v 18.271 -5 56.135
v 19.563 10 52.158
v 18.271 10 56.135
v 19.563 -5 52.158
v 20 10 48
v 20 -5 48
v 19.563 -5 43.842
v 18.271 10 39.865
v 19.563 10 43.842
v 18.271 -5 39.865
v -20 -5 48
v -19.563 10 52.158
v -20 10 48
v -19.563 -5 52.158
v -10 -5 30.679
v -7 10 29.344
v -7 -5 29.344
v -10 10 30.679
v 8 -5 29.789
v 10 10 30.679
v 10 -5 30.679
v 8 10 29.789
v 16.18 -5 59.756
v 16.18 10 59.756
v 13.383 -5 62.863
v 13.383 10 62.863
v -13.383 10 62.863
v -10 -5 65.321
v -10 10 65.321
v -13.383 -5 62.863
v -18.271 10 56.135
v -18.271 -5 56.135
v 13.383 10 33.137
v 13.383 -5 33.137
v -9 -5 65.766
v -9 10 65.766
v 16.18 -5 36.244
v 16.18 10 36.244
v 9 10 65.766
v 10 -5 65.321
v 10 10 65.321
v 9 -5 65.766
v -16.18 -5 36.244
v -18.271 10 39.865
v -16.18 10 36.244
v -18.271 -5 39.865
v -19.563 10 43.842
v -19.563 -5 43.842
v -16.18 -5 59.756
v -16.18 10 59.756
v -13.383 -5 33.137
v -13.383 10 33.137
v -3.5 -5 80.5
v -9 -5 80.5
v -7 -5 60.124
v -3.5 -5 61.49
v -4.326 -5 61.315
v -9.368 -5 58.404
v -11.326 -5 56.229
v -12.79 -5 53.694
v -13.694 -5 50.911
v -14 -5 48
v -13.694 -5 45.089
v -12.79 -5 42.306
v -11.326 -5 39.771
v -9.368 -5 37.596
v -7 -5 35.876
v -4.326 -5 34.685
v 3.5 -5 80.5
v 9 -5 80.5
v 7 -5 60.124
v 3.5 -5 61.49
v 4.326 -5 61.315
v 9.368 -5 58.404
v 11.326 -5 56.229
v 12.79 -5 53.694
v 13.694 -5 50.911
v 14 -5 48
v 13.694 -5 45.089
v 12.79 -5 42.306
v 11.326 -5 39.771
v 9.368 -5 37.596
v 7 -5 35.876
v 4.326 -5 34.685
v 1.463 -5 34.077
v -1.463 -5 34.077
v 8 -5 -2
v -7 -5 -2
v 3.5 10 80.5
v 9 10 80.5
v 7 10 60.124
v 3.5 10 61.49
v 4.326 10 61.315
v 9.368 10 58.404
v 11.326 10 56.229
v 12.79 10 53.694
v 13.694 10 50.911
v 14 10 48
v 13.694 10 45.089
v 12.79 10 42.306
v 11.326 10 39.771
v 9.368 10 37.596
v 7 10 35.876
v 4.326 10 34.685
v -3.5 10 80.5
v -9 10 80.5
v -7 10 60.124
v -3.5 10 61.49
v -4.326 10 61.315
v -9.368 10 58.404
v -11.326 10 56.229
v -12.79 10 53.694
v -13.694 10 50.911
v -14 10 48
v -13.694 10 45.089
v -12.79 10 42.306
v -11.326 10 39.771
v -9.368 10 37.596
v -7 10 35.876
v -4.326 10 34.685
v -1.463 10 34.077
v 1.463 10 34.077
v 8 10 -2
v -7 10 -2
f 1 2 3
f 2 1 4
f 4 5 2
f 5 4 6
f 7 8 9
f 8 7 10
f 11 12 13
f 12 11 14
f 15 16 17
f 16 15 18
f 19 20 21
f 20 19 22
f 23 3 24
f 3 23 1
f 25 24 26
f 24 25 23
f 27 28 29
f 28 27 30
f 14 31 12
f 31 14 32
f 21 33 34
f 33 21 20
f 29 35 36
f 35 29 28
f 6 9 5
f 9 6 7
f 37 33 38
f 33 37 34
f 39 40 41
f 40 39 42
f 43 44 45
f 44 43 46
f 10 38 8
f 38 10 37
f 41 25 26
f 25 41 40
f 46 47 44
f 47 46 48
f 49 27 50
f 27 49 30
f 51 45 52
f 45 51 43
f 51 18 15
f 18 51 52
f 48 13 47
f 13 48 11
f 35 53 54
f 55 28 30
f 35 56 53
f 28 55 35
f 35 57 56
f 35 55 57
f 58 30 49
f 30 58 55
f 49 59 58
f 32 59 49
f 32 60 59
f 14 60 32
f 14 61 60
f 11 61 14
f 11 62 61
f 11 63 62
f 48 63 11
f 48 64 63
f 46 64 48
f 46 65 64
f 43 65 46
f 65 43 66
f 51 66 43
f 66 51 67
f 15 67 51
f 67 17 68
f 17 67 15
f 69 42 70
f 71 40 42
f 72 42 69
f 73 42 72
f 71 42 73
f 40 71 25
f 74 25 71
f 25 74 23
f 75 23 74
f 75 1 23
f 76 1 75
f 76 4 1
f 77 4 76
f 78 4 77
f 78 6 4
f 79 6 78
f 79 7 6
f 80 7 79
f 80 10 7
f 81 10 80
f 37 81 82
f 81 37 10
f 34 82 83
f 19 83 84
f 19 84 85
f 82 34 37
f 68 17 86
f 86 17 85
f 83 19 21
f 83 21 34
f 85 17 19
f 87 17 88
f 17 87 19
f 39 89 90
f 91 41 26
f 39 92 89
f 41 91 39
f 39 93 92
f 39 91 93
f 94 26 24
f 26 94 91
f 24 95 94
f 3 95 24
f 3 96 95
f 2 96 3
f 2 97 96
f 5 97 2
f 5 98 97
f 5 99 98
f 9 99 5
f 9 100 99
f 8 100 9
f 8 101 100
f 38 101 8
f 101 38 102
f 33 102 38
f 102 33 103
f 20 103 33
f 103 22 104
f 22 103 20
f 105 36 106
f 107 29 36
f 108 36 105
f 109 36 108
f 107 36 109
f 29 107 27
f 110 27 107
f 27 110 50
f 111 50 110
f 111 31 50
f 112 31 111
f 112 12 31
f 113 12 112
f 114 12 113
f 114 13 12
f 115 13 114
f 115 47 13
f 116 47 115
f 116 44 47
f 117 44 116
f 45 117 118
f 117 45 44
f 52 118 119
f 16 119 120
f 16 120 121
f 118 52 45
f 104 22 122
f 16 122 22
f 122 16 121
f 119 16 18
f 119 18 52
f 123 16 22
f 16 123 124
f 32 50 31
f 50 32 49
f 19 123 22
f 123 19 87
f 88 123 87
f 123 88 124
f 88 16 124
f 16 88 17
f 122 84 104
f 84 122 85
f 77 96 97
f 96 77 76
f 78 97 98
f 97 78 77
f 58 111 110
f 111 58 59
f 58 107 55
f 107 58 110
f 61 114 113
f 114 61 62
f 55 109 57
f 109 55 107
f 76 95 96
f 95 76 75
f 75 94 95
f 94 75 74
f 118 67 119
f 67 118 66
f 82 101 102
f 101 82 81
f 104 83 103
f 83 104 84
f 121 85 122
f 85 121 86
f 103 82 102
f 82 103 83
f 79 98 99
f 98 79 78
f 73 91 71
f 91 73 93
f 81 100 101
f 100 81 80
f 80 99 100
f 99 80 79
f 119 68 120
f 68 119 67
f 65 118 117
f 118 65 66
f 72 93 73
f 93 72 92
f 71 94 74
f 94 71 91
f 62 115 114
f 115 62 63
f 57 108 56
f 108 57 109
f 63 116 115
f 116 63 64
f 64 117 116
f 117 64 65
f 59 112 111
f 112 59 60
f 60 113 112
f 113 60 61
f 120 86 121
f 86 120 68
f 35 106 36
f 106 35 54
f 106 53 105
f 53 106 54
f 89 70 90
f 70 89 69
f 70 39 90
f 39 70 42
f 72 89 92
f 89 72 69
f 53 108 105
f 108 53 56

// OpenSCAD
//rotace pro tisk


difference() 
{ 
// ode�et distan�n� mezery


union() 
{
// p�i�ten� patic pro sta�en�

difference() 
{ 
// diffference pro  otvor pro osazen� na ty�



union() 
{
// union pro v�lec napojen� na cylinder pro zasazen� do rukojeti

union() 
// union pro p�ipojen� cylinderu na v�lec
{


//cylinder(h = 14, r1 = 17, r2 = 10, center = true); 
//cylinder-nepouzite skoseni napojeni tyce pro usazeni v rukojeti

//zakladn�
translate([0,10,48]) rotate ([90,0,0])cylinder(h = 15, r=20);
// 40 je nastavena vnitrni prumer na 35 a vnejsi na 40
        
} 
#translate([-7,-5,-2]) cube([15,15,35], center = false);

//tloustka upnut� 15mm 
// umisteni ctverce pro dosazeni do rukojeti
//tloustka operky je 4mm + 14mm pro zesileni
//19 je posun nahoru a dolu/////35 vyska propojky
}
translate([0,10,48]) rotate ([90,0,0])cylinder(h = 20, r=14);
// odecitaci valec pro otvor na osazen� ty�e
}
translate([0,2.5,73]) rotate ([90,0,0]) cube(size = [18,15,15], center = true);
//sloupky pro utazeni
}
translate([0,10,75]) rotate ([0,0,0])cube(size = [7,50,40], center = true);
//odecet distancni mezery
}        


//# pro zviditeleneni
//priblizeni shift+prav tlacitko mysi+ pousouvani dopredu/dozadu
